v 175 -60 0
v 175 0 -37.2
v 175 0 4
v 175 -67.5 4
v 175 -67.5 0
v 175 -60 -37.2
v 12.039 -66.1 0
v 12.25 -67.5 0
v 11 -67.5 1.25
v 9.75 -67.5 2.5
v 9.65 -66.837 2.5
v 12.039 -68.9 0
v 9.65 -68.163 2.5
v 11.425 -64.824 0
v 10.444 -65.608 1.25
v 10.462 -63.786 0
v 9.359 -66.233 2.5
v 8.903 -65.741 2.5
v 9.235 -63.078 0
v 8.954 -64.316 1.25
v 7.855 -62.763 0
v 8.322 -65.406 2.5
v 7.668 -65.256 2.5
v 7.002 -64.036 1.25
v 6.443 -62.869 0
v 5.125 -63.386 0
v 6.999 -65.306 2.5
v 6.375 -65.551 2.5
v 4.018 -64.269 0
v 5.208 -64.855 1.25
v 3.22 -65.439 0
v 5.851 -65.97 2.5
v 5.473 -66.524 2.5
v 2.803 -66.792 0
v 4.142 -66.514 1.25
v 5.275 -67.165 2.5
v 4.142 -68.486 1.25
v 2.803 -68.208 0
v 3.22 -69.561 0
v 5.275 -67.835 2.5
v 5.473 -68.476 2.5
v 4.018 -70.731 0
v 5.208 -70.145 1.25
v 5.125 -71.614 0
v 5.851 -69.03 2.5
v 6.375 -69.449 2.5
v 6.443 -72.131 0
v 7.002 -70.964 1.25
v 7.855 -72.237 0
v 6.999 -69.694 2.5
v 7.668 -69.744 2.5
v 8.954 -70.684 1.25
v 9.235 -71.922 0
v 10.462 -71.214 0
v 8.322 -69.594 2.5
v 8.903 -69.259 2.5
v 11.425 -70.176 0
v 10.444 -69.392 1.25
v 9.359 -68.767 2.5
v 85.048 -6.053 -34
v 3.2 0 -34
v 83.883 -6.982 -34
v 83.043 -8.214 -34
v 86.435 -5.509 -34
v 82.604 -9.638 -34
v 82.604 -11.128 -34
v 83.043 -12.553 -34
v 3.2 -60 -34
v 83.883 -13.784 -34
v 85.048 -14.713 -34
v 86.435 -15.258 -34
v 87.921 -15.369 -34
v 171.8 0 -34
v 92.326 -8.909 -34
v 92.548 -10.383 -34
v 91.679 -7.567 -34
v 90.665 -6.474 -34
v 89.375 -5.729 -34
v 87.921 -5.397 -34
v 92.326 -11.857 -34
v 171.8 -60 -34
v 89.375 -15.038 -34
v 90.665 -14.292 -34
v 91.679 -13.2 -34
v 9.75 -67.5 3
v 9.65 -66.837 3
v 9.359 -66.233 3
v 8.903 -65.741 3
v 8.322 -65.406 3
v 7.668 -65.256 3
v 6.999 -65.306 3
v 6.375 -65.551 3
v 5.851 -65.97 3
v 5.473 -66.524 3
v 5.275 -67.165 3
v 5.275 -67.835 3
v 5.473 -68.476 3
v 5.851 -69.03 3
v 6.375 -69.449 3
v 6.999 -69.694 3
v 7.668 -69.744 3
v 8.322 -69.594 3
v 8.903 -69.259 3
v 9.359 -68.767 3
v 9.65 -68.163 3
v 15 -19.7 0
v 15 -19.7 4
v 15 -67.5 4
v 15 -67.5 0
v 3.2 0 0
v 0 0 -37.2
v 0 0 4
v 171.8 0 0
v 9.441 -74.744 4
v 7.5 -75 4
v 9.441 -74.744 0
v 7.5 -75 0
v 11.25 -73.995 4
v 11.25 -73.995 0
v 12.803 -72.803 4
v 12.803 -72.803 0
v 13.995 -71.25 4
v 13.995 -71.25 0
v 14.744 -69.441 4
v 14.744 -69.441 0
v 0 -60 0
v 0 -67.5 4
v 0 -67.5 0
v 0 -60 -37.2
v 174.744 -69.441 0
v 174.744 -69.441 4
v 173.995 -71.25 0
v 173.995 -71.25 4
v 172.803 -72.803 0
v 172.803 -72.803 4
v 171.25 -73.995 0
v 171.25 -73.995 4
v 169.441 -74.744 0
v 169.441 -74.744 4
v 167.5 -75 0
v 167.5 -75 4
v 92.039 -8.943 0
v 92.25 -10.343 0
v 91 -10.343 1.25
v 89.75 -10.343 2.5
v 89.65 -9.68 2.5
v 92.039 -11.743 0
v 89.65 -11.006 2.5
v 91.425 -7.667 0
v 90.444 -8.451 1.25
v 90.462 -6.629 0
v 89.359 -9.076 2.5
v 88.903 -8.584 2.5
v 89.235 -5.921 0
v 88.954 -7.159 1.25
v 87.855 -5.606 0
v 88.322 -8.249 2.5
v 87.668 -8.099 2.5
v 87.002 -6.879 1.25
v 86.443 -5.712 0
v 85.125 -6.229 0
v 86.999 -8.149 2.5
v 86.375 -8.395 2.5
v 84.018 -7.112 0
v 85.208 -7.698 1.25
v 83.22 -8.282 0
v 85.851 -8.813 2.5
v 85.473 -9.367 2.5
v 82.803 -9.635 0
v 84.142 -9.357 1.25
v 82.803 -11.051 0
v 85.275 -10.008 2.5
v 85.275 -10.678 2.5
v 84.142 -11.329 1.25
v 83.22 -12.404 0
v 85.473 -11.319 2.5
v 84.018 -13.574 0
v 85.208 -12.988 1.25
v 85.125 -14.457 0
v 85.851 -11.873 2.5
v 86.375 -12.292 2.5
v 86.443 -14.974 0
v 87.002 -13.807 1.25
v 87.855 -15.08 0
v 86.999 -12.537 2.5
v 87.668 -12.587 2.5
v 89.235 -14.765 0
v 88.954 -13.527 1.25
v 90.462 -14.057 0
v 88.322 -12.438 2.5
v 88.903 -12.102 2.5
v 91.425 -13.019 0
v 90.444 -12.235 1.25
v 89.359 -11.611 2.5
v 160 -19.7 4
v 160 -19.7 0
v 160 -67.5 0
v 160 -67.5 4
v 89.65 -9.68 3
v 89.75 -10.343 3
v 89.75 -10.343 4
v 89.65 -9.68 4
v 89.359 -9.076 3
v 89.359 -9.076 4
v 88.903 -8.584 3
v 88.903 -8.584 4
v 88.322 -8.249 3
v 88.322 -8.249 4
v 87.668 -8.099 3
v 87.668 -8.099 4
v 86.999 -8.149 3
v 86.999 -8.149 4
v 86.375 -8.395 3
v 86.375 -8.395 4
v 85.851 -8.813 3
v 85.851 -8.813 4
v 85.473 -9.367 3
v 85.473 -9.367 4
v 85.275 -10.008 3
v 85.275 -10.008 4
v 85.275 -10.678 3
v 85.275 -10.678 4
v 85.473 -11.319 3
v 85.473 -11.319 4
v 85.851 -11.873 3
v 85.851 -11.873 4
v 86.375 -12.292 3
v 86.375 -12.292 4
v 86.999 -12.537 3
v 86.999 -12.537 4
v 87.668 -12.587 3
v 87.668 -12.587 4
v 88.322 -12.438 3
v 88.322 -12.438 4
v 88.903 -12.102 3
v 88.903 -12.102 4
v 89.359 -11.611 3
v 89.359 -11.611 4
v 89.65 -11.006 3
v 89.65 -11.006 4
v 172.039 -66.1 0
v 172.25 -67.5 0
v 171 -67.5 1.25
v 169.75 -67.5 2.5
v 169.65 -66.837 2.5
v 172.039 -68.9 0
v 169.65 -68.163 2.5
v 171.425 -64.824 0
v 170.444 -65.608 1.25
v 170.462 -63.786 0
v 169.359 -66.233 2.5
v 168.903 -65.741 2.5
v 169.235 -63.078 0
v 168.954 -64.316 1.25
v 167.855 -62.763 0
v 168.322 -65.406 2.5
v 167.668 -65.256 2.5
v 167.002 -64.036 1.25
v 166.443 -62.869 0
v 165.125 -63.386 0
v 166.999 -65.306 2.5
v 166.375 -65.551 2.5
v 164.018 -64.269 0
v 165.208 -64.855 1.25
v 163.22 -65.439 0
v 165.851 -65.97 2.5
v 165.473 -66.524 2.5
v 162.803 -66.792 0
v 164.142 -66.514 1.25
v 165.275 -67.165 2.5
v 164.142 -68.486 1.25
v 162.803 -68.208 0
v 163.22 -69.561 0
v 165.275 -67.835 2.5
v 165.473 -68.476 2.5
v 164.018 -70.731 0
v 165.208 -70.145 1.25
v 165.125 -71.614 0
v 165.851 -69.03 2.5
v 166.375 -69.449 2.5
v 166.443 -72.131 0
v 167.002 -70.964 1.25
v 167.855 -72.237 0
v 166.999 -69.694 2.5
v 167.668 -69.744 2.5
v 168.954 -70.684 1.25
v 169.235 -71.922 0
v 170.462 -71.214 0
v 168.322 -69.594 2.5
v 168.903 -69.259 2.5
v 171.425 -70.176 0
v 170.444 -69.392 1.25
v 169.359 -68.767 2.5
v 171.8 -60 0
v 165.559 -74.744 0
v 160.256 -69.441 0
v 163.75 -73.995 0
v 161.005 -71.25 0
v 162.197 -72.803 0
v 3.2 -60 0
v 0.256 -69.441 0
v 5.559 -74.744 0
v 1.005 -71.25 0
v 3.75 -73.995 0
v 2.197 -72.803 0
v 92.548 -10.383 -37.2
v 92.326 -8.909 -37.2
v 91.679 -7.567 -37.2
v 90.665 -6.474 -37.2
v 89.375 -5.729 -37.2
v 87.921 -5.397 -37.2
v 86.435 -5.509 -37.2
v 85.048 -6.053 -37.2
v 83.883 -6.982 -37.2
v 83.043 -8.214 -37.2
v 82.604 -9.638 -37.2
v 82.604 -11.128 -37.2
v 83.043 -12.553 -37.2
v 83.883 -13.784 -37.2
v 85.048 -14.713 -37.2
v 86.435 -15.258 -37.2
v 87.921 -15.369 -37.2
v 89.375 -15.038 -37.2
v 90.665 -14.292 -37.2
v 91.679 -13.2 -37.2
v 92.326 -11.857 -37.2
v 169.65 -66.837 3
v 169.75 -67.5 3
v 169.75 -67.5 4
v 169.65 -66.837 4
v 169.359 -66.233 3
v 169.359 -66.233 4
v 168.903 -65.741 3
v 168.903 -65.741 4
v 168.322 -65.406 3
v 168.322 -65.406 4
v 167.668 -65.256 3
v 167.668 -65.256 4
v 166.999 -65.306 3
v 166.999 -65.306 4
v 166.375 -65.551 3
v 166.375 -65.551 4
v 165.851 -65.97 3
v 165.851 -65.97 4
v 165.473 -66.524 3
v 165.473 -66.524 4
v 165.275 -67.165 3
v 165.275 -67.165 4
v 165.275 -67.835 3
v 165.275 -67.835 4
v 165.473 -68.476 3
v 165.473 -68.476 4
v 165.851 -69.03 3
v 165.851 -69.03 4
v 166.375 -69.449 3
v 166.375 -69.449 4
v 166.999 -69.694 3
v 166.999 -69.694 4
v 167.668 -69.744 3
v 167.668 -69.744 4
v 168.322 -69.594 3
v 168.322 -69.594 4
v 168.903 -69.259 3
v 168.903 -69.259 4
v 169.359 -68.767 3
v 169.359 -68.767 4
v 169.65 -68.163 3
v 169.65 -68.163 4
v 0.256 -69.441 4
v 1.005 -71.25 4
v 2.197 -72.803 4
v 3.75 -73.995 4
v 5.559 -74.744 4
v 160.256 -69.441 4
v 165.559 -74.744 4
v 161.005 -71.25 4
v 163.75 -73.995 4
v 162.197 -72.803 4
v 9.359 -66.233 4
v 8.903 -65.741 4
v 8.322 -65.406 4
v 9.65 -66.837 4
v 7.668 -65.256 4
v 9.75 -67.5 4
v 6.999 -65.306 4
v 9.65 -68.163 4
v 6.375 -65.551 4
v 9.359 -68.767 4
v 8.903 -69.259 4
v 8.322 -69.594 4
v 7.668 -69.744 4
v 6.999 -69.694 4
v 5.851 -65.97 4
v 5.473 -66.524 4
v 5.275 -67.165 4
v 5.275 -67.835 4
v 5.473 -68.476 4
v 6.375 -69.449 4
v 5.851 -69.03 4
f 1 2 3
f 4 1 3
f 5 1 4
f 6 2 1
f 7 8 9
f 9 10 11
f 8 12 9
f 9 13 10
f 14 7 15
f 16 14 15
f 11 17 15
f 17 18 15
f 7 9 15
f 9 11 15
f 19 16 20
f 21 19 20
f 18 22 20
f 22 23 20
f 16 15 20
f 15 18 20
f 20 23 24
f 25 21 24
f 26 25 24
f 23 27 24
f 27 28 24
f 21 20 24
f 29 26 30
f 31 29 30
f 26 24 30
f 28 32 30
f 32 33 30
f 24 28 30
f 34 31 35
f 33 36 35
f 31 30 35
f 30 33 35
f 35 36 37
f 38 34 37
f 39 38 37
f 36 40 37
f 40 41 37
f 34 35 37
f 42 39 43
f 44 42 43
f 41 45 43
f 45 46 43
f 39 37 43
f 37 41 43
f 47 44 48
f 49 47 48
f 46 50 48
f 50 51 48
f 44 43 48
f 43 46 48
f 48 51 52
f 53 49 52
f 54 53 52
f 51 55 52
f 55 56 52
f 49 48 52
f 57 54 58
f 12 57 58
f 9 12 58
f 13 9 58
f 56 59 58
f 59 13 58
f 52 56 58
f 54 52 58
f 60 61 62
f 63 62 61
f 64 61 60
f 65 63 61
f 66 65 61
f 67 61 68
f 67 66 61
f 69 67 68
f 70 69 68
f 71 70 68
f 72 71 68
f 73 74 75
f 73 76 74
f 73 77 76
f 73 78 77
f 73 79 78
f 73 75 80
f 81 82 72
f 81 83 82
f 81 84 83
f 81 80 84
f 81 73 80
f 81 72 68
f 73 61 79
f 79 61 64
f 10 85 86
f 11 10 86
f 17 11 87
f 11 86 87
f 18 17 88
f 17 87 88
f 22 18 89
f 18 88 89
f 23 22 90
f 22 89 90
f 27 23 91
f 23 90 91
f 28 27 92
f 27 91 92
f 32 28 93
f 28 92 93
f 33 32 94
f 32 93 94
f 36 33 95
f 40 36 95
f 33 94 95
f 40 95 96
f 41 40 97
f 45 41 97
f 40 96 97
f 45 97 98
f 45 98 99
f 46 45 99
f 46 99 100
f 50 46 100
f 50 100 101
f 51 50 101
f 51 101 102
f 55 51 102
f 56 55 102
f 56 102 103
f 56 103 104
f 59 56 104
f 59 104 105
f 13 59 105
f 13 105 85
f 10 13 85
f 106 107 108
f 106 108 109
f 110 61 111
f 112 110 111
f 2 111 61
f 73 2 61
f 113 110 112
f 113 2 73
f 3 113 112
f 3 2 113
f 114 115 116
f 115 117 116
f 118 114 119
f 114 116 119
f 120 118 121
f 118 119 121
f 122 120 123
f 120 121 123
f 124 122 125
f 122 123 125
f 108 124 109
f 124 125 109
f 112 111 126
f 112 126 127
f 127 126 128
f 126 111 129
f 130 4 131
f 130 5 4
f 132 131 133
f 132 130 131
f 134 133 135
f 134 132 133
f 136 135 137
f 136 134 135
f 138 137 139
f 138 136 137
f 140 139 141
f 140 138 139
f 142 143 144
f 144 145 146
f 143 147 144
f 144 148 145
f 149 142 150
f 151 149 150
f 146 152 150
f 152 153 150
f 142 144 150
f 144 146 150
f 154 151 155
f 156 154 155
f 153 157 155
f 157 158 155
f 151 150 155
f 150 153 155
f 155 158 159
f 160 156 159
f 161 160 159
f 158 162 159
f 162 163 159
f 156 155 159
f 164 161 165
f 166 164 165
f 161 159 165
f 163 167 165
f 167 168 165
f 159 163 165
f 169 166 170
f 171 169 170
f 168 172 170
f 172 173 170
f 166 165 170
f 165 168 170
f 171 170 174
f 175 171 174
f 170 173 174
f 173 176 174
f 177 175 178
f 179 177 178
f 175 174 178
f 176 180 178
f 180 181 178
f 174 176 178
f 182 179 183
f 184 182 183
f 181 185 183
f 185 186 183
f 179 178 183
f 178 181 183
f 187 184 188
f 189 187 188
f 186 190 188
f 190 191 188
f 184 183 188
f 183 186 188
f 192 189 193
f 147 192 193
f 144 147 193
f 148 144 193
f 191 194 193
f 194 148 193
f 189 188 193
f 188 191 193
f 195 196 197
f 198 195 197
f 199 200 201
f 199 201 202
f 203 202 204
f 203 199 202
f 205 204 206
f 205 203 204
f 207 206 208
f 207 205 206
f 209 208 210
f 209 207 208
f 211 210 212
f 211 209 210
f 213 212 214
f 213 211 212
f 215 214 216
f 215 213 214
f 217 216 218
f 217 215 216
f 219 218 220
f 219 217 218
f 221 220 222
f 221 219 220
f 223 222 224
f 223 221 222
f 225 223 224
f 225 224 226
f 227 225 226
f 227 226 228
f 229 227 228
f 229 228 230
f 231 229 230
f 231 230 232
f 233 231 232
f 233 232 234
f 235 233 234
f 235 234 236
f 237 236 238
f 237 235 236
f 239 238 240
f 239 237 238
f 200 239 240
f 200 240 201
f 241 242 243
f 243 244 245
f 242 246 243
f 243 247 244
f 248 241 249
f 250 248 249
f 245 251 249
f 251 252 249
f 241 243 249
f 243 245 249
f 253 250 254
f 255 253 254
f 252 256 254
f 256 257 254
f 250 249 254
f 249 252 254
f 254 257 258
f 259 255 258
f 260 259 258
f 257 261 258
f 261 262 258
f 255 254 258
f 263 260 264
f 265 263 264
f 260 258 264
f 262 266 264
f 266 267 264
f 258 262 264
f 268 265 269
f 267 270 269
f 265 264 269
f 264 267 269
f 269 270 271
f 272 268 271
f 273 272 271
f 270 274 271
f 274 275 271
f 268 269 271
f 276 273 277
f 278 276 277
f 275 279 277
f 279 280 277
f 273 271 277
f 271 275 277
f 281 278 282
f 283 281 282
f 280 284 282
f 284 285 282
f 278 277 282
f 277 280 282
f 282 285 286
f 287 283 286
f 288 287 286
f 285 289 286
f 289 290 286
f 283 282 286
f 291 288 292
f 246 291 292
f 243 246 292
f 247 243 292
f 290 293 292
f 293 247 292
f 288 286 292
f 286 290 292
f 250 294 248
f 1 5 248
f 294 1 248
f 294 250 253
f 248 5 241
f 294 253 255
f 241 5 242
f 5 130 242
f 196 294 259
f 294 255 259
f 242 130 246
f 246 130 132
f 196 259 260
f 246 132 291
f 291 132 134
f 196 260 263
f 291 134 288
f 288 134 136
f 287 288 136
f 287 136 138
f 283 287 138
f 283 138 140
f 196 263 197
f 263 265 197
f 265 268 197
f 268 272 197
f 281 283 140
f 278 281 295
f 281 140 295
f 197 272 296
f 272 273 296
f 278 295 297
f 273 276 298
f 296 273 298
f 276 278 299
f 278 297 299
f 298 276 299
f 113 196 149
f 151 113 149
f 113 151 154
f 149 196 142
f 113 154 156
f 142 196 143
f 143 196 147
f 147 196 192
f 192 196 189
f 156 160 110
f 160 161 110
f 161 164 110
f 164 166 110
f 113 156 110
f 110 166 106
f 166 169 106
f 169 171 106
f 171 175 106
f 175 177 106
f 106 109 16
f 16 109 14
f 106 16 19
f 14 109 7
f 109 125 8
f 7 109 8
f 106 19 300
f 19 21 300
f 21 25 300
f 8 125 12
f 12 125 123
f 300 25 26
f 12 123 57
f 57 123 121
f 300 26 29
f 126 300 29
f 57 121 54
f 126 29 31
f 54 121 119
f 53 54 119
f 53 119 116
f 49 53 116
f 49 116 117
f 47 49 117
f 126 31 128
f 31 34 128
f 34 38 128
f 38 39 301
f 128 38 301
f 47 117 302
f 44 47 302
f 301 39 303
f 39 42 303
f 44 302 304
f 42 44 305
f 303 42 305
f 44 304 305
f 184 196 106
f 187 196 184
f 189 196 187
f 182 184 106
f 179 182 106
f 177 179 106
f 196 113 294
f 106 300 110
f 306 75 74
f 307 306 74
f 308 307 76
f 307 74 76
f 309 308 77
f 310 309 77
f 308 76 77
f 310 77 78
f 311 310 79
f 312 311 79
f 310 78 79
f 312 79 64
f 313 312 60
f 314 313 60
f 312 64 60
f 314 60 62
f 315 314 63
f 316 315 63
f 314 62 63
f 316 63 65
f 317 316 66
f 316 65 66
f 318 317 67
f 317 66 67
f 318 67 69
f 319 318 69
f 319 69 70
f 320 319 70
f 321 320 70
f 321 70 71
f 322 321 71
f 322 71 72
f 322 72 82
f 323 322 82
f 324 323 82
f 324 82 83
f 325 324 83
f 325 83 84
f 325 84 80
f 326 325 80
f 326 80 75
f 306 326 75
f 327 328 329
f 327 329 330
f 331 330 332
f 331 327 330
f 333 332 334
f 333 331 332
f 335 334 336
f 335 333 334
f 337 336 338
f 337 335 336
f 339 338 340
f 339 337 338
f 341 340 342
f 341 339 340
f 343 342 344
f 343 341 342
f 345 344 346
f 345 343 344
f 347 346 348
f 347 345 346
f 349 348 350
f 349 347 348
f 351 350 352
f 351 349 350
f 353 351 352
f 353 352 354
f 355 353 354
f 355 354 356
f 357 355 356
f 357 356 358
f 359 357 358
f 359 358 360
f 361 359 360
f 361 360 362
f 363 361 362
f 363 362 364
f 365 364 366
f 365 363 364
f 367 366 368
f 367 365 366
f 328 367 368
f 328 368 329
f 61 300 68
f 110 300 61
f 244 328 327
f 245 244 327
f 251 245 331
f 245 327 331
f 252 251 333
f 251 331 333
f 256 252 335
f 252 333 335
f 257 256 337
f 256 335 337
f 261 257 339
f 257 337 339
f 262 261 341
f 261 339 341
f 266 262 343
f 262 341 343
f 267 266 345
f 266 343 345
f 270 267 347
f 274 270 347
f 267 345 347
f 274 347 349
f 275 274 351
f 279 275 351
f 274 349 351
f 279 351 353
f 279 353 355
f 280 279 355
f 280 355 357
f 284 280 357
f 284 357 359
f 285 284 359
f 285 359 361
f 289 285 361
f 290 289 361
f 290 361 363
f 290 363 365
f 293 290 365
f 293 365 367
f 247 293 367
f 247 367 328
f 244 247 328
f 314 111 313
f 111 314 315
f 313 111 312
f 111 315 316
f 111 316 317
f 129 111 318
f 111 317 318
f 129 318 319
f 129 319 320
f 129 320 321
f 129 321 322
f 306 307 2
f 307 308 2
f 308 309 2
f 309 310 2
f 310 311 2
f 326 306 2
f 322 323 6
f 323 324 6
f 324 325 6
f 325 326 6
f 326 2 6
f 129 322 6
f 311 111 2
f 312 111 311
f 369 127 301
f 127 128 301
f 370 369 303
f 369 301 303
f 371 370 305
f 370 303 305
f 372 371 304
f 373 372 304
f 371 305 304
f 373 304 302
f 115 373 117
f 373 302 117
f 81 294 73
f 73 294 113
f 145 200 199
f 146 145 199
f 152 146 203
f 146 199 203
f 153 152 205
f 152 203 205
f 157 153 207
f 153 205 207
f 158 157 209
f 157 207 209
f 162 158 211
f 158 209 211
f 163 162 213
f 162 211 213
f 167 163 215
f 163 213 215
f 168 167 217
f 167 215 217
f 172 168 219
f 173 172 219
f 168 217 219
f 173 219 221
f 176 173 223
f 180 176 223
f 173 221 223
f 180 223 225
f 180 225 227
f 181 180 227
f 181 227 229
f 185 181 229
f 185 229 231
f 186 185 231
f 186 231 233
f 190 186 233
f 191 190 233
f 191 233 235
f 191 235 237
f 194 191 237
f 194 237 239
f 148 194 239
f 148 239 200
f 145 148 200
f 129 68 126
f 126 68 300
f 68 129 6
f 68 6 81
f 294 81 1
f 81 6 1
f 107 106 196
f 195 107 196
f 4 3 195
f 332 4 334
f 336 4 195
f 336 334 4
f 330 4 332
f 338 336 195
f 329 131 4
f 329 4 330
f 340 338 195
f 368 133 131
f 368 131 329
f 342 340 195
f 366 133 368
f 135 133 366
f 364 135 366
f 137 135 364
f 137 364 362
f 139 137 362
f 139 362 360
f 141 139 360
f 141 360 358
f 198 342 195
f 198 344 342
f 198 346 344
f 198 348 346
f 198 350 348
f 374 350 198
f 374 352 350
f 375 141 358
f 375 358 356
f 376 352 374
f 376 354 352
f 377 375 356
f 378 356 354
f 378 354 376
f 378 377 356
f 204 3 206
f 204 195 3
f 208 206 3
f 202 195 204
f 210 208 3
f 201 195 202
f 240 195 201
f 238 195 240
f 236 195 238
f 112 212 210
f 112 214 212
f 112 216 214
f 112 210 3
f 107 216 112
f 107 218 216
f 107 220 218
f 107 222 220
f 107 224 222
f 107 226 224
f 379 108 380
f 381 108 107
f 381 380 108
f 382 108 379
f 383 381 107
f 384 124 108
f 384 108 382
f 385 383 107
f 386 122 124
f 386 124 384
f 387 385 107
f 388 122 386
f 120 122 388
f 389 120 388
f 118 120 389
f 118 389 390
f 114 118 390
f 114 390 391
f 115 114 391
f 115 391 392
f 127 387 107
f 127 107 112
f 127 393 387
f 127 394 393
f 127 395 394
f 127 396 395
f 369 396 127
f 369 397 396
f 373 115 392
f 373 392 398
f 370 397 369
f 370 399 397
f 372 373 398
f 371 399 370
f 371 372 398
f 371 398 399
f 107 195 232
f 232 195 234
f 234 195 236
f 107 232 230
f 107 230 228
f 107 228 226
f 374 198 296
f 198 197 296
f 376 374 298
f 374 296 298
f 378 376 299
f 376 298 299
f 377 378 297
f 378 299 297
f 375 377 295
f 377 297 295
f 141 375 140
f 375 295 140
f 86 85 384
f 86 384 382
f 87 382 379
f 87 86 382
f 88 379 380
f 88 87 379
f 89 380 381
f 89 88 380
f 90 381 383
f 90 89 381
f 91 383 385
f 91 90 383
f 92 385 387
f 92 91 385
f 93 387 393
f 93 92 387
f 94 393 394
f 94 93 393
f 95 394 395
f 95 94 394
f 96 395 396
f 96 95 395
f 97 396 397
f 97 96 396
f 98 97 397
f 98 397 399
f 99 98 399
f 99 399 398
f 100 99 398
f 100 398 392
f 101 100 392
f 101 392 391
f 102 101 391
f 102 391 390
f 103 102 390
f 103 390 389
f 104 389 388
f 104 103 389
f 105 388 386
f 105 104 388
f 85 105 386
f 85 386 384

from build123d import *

# Parameters (mm, degrees)
F0_W      = 3.2
F0_H      = 60
F0_W_2    = 168.6
F1_DEPTH  = 3
F2_DEPTH  = 37.2
F3_W      = 60
F3_H      = 3.2
F4_DEPTH  = 168.6
F5_W      = 15
F5_H      = 3
F6_DEPTH  = 15
F7_W      = 15
F7_H      = 3
F8_DEPTH  = 15
F9_R      = 2.25
F10_DEPTH = 25
F11_DEPTH = 1
F12_SIZE  = 2.5
F13_W     = 35.8230434358
F13_H     = 13.5607076809
F14_DEPTH = 175.001
F15_R     = 5
F16_DEPTH = 25
F17_R     = 7.49999
F18_DEPTH = 40.3


# Not quite as in the source:
# - a fillet or chamfer is up to 0.001 mm smaller than in the source, because OpenCascade refuses the exact size


with BuildPart() as f1:
    # F0 (on Top) → F1 (new body)
    with BuildSketch(Plane.XY):
        with Locations((1.6, -30)):
            Rectangle(F0_W, F0_H)
        with Locations((87.5, -30)):
            Rectangle(F0_W_2, F0_H)
        with Locations((173.4, -30)):
            Rectangle(F0_W, F0_H)
    extrude(amount=F1_DEPTH)

    # F0 (on Top) → F2 (join)
    with BuildSketch(Plane.XY):
        with Locations((1.6, -30)):
            Rectangle(F0_W, F0_H)
        with Locations((173.4, -30)):
            Rectangle(F0_W, F0_H)
    extrude(amount=-F2_DEPTH)

    # F3 (on face) → F4 (join, through all)
    with BuildSketch(Plane(origin=(171.8, 0, 0), x_dir=(0, -1, 0), z_dir=(-1, 0, 0))):
        with Locations((30, -35.6)):
            Rectangle(F3_W, F3_H)
    extrude(amount=F4_DEPTH)

    # F5 (on face) → F6 (join)
    with BuildSketch(Plane.XZ.offset(60)):
        with Locations((7.5, 1.5)):
            Rectangle(F5_W, F5_H)
        with Locations((167.5, 1.5)):
            Rectangle(F5_W, F5_H)
    extrude(amount=F6_DEPTH)

    # F7 (on face) → F8 (join)
    with BuildSketch(Plane(origin=(0, 0, 0), x_dir=(-1, 0, 0), z_dir=(0, 1, 0))):
        with Locations((-167.5, 1.5)):
            Rectangle(F7_W, F7_H)
        with Locations((-7.5, 1.5)):
            Rectangle(F7_W, F7_H)
    extrude(amount=F8_DEPTH)

    # F9 (on face) → F10 (cut)
    with BuildSketch(Plane.XY.offset(3)):
        with Locations((167.5, 7.5)):
            Circle(F9_R)
        with Locations((167.5, -67.5)):
            Circle(F9_R)
        with Locations((7.5, -67.5)):
            Circle(F9_R)
        with Locations((87.5, -10.3430738673)):
            Circle(F9_R)
    extrude(amount=-F10_DEPTH, mode=Mode.SUBTRACT)

    # F11 (add): a face of the model
    f11_faces = [f1.faces().sort_by_distance(p)[0] for p in [
        (87.3877644613, -29.9749671624, 3),
    ]]
    extrude(f11_faces, amount=F11_DEPTH)

    # F12
    f12_edges = [f1.edges().sort_by_distance(p)[0] for p in [
        (165.25, -67.5, 0),
        (165.25, 7.5, 0),
        (85.25, -10.343074, 0),
        (5.25, -67.5, 0),
    ]]
    chamfer(f12_edges, length=F12_SIZE)

    # F13 (on face) → F14 (cut, through all)
    with BuildSketch(Plane(origin=(0, 0, 0), x_dir=(0, -1, 0), z_dir=(-1, 0, 0))):
        with Locations((-17.9115217179, 6.7803538404)):
            Rectangle(F13_W, F13_H)
    extrude(amount=-F14_DEPTH, mode=Mode.SUBTRACT)

    # F15 (on face) → F16 (cut)
    with BuildSketch(Plane.XY.offset(-34)):
        with Locations((87.5478237867, -10.3831542656)):
            Circle(F15_R)
    extrude(amount=-F16_DEPTH, mode=Mode.SUBTRACT)

    # F17 (radius 7.5 in the source; OpenCascade refuses exactly that, so slightly less here)
    f17_edges = [f1.edges().sort_by_distance(p)[0] for p in [
        (15, -75, 2),
        (0, -75, 2),
        (160, -75, 2),
        (175, -75, 2),
    ]]
    fillet(f17_edges, radius=F17_R)

    # F18 (cut): a face of the model
    f18_faces = [f1.faces().sort_by_distance(p)[0] for p in [
        (87.5, -60, 2),
    ]]
    extrude(f18_faces, amount=-F18_DEPTH, mode=Mode.SUBTRACT)


solid = f1.part
